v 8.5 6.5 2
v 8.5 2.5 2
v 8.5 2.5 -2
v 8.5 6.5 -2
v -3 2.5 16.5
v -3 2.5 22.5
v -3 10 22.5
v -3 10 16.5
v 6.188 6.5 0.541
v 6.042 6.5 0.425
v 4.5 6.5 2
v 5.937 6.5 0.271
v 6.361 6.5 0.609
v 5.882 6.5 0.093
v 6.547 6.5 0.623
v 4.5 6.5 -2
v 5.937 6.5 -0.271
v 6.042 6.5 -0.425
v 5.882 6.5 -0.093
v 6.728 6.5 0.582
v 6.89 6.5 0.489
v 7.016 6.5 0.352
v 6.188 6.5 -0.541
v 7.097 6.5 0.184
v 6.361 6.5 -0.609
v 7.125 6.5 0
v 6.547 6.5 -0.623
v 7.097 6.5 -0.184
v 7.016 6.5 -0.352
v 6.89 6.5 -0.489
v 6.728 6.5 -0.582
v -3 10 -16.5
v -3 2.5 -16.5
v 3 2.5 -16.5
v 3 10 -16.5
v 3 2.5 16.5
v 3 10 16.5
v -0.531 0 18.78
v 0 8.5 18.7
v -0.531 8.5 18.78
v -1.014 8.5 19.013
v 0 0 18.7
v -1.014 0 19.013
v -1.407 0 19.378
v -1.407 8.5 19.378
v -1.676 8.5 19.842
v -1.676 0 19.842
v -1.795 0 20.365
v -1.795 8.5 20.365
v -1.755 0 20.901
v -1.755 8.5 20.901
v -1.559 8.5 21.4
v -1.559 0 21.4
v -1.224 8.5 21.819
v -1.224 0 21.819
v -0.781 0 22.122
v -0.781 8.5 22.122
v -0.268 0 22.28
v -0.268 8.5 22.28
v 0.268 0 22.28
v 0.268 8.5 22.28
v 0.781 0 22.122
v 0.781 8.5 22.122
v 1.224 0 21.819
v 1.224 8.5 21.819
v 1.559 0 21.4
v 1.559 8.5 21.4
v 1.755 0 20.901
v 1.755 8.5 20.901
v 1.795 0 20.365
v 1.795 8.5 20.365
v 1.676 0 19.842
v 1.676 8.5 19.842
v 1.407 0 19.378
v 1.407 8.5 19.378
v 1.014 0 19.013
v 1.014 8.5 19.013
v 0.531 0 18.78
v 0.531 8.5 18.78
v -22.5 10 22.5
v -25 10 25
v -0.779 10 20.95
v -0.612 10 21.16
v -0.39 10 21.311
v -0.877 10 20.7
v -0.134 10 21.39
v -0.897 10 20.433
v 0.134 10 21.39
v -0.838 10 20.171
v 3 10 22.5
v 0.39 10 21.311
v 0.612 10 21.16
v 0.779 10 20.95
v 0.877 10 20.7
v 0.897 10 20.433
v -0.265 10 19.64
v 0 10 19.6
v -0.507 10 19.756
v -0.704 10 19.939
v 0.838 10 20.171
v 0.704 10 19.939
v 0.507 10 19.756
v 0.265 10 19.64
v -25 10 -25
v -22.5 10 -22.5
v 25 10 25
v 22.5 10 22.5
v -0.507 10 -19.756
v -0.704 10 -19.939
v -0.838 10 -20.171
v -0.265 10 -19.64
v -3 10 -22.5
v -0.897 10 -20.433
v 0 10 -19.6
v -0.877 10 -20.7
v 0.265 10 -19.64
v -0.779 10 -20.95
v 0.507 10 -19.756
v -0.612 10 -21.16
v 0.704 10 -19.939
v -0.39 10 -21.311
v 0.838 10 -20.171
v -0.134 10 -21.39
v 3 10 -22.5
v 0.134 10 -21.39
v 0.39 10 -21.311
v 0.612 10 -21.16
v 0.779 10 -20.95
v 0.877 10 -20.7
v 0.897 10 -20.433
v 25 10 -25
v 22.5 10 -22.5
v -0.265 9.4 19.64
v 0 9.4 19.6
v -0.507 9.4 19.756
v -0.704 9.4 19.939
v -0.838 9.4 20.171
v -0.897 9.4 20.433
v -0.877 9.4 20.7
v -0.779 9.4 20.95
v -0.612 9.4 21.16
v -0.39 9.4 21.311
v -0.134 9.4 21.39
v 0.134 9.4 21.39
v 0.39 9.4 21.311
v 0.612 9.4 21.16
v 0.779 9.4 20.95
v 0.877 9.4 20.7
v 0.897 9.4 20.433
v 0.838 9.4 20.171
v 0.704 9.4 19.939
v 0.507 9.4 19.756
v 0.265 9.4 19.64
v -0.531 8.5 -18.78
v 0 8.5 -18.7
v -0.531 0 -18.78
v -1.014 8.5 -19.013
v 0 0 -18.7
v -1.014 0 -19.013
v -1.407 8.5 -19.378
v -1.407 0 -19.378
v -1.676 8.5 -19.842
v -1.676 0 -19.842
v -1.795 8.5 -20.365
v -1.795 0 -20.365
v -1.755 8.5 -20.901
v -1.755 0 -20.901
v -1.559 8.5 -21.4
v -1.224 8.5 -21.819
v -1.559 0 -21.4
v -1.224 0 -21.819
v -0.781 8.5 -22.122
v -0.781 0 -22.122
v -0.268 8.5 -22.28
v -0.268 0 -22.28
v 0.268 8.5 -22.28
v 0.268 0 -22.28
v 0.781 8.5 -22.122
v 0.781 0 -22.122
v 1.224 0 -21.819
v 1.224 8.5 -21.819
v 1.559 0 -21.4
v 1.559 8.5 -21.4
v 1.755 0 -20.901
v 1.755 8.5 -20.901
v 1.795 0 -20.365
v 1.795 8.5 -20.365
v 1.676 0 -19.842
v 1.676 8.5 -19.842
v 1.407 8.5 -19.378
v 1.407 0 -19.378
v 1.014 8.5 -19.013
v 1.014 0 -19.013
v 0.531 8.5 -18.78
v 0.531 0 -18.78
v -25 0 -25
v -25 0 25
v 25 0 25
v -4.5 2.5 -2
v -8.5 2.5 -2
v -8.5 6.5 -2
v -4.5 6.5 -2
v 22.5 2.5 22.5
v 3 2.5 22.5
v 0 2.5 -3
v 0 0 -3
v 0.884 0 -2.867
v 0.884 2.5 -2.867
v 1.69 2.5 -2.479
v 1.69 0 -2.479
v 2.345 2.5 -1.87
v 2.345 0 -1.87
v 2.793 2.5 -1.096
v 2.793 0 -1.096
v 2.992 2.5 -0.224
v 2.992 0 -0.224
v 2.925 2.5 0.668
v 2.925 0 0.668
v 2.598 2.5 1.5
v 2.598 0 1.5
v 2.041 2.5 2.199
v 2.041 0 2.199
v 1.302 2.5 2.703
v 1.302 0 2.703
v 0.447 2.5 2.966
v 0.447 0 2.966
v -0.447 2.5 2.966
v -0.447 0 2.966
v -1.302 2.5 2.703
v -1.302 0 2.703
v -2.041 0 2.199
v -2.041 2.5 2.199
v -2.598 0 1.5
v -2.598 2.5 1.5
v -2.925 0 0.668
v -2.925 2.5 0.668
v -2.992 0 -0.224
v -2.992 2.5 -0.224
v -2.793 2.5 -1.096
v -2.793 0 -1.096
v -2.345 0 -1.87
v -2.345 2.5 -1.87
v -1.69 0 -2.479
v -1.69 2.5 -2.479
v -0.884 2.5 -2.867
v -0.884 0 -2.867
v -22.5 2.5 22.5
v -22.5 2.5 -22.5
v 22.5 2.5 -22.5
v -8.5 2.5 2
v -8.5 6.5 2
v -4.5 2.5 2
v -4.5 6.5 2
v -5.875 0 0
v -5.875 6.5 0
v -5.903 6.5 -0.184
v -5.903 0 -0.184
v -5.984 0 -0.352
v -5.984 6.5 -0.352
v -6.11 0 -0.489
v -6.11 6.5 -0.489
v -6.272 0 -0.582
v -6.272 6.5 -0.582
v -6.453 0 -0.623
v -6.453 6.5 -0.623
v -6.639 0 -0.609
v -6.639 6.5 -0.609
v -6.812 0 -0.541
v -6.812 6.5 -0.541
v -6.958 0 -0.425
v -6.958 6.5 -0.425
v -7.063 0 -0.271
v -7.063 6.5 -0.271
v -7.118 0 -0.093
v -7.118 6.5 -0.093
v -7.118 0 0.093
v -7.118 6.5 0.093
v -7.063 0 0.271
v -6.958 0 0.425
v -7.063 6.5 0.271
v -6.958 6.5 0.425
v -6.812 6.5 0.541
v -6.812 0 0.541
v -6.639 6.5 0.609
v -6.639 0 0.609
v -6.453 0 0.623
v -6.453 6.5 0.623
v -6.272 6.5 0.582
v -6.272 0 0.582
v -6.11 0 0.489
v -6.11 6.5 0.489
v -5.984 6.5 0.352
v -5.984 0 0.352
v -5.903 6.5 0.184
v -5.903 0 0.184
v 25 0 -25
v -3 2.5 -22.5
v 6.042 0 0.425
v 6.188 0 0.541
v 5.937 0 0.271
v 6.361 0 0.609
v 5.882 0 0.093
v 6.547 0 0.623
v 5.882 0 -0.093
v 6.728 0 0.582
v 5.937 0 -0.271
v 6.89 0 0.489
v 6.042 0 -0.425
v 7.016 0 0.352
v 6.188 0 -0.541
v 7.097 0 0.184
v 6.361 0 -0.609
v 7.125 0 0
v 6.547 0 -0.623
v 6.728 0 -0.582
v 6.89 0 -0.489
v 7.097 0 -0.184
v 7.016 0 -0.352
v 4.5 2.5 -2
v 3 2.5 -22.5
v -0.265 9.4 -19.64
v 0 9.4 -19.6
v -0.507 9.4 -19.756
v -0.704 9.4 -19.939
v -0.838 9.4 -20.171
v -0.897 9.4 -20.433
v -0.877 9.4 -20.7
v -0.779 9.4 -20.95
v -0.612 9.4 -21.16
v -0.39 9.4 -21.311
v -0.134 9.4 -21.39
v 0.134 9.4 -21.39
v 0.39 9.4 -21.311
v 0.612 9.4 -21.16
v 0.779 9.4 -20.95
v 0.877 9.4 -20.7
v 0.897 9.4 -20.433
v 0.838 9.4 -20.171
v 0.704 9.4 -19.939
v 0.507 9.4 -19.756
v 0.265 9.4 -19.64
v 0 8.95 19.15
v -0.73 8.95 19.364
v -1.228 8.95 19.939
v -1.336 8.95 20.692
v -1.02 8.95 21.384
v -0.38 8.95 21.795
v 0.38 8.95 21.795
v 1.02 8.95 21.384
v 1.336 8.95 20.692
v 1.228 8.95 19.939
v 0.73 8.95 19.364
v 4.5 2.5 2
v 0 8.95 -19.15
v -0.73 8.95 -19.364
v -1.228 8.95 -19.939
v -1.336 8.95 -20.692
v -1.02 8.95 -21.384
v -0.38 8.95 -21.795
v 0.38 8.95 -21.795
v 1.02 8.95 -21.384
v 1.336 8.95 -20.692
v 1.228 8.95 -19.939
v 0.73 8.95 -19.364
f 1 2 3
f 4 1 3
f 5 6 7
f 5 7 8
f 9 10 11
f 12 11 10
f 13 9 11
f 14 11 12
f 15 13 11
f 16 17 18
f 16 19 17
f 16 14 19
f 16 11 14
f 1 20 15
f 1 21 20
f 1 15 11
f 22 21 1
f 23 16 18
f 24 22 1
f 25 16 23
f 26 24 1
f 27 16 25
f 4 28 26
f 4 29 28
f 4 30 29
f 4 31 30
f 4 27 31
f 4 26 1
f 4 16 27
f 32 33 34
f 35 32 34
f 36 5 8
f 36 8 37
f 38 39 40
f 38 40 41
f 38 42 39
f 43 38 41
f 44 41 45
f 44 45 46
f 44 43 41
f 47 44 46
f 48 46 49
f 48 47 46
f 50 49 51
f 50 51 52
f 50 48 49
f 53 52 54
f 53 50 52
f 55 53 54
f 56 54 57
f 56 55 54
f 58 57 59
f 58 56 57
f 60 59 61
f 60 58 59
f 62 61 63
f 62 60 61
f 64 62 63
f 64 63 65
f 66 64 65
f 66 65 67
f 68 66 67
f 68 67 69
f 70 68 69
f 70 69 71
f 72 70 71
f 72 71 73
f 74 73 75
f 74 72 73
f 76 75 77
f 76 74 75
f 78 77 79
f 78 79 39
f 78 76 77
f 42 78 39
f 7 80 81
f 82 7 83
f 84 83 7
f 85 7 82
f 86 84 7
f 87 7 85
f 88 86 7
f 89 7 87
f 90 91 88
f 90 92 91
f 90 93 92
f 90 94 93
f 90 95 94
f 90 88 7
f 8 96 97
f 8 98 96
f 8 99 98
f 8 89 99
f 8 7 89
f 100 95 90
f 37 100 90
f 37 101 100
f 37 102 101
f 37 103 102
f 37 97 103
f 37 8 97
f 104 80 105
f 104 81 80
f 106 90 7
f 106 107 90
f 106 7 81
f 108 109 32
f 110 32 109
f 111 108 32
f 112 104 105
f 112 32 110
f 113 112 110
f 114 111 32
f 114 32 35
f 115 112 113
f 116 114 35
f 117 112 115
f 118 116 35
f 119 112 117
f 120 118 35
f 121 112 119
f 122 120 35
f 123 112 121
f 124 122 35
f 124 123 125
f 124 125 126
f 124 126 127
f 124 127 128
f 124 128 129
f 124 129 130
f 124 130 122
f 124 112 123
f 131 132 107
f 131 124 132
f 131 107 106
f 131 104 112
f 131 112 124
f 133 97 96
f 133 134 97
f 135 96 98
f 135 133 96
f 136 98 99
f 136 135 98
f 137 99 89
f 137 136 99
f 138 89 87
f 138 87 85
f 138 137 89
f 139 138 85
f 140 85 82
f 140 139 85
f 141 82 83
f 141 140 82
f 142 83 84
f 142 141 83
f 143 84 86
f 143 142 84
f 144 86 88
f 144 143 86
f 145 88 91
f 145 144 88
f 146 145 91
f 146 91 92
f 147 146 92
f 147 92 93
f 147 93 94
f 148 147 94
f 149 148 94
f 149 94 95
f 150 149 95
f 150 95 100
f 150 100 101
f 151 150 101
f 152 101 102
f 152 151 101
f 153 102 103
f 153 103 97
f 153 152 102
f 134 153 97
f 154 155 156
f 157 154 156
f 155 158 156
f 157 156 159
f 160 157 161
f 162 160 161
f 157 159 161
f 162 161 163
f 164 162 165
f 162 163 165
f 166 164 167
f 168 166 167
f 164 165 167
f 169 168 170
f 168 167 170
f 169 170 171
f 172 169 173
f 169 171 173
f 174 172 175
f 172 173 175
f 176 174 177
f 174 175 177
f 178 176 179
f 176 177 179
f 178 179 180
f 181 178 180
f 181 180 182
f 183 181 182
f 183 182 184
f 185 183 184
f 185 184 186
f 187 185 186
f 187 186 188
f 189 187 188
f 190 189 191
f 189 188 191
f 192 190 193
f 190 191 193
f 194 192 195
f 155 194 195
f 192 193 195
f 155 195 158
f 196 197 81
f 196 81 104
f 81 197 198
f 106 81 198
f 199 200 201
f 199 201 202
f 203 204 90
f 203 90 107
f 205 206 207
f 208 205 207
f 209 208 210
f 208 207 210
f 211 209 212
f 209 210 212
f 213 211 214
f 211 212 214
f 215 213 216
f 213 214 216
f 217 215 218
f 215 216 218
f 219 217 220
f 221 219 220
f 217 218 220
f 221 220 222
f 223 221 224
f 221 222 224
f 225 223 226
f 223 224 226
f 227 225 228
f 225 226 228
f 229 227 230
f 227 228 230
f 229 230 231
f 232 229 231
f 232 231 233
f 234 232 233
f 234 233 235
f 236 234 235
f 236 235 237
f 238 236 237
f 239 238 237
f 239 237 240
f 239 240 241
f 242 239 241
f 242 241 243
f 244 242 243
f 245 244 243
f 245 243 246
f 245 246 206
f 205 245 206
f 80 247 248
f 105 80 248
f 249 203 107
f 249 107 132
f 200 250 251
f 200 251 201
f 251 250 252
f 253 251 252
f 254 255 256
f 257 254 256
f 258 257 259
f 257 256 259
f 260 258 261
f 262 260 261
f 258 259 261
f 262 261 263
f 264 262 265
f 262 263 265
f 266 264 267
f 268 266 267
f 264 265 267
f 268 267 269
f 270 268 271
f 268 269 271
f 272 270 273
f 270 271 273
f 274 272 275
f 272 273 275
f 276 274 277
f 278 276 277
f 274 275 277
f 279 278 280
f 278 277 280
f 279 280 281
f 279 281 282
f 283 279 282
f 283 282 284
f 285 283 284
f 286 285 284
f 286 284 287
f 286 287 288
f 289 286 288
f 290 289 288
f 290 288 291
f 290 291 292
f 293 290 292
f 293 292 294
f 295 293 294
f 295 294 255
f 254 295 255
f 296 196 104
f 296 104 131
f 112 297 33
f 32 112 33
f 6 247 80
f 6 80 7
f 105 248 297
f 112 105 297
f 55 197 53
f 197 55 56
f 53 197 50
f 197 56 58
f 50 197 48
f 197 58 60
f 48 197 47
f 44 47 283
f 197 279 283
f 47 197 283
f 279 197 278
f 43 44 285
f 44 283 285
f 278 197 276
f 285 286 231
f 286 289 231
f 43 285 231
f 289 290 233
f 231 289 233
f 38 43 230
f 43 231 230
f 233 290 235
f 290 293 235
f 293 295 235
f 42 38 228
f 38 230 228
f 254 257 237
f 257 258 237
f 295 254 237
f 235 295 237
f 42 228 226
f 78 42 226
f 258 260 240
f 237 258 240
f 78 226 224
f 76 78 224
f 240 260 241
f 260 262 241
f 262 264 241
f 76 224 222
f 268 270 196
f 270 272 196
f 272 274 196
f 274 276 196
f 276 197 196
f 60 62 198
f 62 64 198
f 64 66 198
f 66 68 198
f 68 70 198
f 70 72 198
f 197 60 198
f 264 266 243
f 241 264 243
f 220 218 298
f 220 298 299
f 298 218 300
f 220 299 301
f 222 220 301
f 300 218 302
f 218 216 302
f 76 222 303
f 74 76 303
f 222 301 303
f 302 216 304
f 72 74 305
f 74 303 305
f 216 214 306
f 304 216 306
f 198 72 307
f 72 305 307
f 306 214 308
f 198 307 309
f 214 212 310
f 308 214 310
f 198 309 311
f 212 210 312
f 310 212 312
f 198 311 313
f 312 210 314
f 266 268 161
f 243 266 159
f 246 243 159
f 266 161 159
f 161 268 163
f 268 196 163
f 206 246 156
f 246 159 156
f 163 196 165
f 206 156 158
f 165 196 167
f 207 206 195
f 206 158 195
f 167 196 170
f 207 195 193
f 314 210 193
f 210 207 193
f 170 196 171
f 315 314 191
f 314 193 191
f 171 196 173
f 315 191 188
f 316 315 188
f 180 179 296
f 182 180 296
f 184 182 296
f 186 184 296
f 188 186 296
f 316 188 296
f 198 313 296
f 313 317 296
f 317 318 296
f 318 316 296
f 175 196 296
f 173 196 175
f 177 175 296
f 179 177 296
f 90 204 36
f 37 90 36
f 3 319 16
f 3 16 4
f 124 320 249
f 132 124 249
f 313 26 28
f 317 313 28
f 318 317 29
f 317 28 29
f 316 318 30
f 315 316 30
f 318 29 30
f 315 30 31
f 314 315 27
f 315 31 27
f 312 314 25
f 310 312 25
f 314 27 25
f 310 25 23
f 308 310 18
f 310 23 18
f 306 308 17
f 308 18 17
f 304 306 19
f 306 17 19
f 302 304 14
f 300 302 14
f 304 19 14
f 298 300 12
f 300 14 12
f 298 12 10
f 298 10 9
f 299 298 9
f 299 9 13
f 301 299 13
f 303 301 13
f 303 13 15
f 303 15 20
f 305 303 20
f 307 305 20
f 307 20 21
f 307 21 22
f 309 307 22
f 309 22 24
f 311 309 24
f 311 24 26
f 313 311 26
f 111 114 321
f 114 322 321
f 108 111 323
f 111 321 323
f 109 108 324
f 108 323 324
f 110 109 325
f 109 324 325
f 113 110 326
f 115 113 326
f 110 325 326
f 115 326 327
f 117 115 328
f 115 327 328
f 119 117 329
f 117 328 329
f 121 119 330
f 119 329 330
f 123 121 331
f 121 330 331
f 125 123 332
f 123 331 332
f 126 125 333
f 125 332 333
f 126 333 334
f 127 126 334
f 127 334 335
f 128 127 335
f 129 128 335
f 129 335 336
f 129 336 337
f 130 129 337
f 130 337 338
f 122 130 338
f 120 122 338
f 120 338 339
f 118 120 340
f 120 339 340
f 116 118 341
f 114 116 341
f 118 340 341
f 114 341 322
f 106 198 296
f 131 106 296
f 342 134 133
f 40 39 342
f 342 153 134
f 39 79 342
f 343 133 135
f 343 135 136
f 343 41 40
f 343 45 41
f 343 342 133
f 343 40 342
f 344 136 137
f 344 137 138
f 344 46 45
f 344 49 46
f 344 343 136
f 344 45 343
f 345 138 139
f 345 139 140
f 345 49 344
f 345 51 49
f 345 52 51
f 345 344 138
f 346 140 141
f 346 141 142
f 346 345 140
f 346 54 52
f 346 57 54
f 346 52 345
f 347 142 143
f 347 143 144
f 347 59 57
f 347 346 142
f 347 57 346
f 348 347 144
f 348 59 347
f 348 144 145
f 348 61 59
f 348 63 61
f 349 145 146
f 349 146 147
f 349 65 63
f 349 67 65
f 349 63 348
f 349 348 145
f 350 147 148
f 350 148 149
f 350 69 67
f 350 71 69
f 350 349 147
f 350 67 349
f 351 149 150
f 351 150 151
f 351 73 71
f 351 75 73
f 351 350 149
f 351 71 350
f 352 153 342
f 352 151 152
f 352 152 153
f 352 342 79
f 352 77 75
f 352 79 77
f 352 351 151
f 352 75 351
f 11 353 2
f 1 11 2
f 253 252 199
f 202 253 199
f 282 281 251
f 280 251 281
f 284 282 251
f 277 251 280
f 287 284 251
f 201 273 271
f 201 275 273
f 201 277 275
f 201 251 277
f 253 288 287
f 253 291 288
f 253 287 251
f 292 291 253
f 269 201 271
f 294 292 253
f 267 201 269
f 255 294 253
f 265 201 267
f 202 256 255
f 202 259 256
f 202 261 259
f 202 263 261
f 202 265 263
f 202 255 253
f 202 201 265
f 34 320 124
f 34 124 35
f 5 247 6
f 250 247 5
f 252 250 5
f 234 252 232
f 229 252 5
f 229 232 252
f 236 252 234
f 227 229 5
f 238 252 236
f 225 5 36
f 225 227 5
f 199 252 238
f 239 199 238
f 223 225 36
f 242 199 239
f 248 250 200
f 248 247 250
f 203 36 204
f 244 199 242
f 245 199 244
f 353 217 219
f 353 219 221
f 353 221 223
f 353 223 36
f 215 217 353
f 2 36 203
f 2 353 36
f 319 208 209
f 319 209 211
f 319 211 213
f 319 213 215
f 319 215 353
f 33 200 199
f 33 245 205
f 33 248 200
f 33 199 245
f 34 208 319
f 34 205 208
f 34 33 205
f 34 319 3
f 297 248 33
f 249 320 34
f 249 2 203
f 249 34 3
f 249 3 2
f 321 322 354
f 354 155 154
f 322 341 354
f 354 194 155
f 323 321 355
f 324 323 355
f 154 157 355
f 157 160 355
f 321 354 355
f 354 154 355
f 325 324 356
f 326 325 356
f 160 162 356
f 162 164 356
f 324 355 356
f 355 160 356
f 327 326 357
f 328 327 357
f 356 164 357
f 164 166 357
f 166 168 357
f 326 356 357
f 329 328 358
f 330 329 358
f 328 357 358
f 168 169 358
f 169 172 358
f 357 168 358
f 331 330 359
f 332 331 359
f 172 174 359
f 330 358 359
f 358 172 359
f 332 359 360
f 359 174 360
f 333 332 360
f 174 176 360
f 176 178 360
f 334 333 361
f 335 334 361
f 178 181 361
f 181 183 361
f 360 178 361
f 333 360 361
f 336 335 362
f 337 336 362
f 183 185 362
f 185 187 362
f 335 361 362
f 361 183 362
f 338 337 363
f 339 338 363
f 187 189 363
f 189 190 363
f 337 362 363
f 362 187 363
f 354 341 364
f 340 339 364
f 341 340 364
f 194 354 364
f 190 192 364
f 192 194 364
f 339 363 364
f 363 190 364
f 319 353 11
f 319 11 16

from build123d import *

# Parameters (mm, degrees)
SKETCH1_W           = 50
SKETCH1_H           = 50
BOSS_EXTRUDE1_DEPTH = 10
SHELL1_T            = -2.5
SKETCH5_W           = 6
SKETCH5_H           = 6
BOSS_EXTRUDE3_DEPTH = 7.5
SKETCH9_R           = 3
CUT_EXTRUDE1_DEPTH  = 37.742346142
SKETCH15_W          = 4
SKETCH15_H          = 4
BOSS_EXTRUDE5_DEPTH = 4
M1_6_TAPPED_HOLE2_D = 1.25


with BuildPart() as part:
    # Sketch1 → Boss-Extrude1 (new body)
    with BuildSketch(Plane(origin=(0, 0, 0), x_dir=(1, 0, 0), z_dir=(0, 1, 0))):
        Rectangle(SKETCH1_W, SKETCH1_H)
    extrude(amount=BOSS_EXTRUDE1_DEPTH)

    # Shell1
    shell1_openings = [part.faces().sort_by_distance(p)[0] for p in [
        (0, 10, 0),
    ]]
    offset(amount=SHELL1_T, openings=shell1_openings, kind=Kind.INTERSECTION)

    # Sketch5 → Boss-Extrude3 (add)
    with BuildSketch(Plane(origin=(0, 2.5, 0), x_dir=(1, 0, 0), z_dir=(0, 1, 0))):
        with Locations((0, -19.5)):
            Rectangle(SKETCH5_W, SKETCH5_H)
    boss_extrude3 = extrude(amount=BOSS_EXTRUDE3_DEPTH)

    # Sketch8 → CSK SLOT for M1.6 Countersunk Flat Head Screw1 (revolve, cut)
    with BuildSketch(Plane(origin=(0, 0, 20.5), x_dir=(0, 0, -1), z_dir=(1, 0, 0))):
        Polygon((0, 0), (0, 10), (0.9, 10), (0.9, 9.4), (1.8, 8.5), (1.8, 0), align=None)
    csk_slot_for_m1_6_countersunk_flat_head = revolve(axis=Axis((0, -6.35, 20.5), (0, 1, 0)), mode=Mode.SUBTRACT)

    # Mirror1: Boss-Extrude3, CSK SLOT for M1.6 Countersunk Flat Head Screw1 across plane
    add(boss_extrude3.mirror(Plane.XY))
    add(csk_slot_for_m1_6_countersunk_flat_head.mirror(Plane.XY), mode=Mode.SUBTRACT)

    # Sketch9 → Cut-Extrude1 (cut, through all)
    with BuildSketch(Plane.XZ):
        with Locations(Location((0, 0, 0), (0, 0, 270))):
            Circle(SKETCH9_R)
    extrude(amount=-CUT_EXTRUDE1_DEPTH, mode=Mode.SUBTRACT)

    # Sketch15 → Boss-Extrude5 (add)
    with BuildSketch(Plane(origin=(0, 2.5, 0), x_dir=(1, 0, 0), z_dir=(0, 1, 0))):
        with Locations((-6.5, 0)):
            Rectangle(SKETCH15_W, SKETCH15_H)
        with Locations((6.5, 0)):
            Rectangle(SKETCH15_W, SKETCH15_H)
    extrude(amount=BOSS_EXTRUDE5_DEPTH)

    # M1.6 Tapped Hole2 (through all)
    with Locations(Plane(origin=(0, 0, 0), x_dir=(-1, 0, 0), z_dir=(0, -1, 0))):
        with Locations((-6.5, 0), (6.5, 0)):
            Hole(M1_6_TAPPED_HOLE2_D / 2)


solid = part.part
